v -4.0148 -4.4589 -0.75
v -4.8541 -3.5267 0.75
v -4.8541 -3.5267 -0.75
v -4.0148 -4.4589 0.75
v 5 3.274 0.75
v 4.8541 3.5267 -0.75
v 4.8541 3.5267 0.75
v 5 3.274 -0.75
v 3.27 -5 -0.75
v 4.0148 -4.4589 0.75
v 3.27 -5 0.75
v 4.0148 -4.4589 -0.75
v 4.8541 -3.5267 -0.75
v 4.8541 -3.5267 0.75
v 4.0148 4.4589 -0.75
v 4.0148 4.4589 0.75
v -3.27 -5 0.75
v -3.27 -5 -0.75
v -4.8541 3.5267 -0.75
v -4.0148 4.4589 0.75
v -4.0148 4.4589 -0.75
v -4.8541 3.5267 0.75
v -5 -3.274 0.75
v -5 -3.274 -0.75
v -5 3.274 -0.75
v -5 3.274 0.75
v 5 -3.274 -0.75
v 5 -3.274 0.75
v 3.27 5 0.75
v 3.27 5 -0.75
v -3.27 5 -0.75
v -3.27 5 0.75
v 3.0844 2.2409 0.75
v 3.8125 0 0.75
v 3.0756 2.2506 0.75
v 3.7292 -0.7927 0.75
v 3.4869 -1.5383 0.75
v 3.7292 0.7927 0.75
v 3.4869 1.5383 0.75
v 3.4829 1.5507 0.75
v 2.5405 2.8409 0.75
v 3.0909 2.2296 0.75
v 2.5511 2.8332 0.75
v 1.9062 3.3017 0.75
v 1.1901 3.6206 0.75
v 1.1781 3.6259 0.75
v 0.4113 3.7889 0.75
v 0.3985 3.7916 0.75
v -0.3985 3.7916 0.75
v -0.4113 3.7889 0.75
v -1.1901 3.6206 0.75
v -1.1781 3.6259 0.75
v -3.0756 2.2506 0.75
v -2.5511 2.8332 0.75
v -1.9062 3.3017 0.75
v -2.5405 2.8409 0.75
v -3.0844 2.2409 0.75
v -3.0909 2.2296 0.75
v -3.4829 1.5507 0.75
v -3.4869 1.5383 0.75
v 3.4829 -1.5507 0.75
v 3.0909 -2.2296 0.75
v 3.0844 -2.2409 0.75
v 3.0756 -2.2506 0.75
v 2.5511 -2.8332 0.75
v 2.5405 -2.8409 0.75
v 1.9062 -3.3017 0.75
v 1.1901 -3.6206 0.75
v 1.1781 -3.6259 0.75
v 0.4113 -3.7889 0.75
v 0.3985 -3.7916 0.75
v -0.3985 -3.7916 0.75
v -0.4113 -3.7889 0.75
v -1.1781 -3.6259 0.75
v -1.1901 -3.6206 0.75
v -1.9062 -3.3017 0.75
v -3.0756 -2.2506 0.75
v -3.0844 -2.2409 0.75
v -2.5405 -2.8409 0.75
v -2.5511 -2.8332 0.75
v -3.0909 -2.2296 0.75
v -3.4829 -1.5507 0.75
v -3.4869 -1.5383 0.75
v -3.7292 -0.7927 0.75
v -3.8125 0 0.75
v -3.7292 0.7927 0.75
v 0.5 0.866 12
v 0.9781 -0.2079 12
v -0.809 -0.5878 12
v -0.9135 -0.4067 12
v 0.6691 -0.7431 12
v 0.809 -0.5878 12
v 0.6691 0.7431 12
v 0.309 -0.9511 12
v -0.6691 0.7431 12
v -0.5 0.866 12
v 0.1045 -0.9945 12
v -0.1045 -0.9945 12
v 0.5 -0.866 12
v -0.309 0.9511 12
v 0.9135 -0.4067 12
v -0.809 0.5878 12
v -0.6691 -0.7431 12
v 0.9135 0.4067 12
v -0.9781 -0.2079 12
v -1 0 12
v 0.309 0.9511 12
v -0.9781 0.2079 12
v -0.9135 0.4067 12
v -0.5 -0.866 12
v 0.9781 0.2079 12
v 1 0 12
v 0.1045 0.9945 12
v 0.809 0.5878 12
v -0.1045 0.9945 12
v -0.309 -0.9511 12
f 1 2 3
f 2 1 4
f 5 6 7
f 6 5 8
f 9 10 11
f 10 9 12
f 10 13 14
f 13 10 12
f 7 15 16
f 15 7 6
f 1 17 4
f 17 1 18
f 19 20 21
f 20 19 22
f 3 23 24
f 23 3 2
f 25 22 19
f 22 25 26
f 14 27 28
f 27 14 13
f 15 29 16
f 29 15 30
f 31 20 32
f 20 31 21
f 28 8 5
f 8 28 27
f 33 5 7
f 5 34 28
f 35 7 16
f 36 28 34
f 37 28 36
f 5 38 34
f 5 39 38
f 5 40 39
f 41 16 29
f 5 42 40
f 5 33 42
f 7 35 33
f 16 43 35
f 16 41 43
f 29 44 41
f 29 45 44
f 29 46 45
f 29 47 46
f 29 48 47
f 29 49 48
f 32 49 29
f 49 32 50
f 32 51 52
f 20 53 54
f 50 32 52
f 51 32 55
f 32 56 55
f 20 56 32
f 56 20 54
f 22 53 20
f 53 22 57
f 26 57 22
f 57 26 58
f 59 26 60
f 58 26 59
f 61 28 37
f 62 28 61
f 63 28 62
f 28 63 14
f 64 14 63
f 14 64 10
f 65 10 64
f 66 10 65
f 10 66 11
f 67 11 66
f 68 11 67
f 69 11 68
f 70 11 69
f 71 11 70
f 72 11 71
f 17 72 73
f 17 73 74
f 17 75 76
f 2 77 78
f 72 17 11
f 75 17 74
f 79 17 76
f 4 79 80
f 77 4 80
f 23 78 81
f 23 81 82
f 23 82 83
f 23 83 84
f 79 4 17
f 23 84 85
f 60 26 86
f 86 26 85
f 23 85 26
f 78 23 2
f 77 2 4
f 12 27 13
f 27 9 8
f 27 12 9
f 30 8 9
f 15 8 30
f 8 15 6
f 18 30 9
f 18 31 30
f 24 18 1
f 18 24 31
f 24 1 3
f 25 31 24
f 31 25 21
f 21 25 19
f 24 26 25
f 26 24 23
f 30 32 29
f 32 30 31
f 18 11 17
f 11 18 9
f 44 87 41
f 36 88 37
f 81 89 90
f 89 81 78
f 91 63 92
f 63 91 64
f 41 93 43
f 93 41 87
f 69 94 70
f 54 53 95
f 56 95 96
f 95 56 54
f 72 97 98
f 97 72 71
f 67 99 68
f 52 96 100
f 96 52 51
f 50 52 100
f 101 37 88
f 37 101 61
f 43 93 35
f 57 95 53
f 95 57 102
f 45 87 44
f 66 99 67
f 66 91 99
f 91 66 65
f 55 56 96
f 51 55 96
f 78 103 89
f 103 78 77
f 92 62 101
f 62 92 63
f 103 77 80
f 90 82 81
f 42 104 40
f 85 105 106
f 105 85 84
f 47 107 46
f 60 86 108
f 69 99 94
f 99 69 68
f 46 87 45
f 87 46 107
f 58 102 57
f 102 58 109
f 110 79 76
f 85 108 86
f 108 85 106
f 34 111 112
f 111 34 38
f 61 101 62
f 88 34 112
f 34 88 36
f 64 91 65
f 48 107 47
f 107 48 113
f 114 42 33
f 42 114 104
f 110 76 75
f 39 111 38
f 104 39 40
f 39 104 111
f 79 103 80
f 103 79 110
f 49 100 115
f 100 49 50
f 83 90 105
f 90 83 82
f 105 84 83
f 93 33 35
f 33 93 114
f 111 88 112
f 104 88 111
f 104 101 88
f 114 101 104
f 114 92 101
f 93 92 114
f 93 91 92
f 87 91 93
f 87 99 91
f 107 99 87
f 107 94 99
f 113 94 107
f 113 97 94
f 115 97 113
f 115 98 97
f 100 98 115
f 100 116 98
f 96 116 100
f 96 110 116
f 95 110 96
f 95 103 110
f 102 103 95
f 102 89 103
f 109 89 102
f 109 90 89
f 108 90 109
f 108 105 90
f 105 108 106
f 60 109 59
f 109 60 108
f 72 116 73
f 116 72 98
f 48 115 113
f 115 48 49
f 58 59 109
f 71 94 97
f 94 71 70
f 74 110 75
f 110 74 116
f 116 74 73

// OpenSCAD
Base = 10;
Base_Height = 1.5;
Curve = 6;
Cone_Height = 12;
Cone_Bottom_Width = 4;
Cone_Top_Width = 1;

$fn = 30;

difference(){
	cube([Base,Base,Base_Height], center=true);
	difference(){
		cylinder(Base_Height+.1,r=Curve*2, center=true);
		cylinder(Base_Height+.1,r=Curve, center=true);
	}
}
cylinder(Cone_Height,Cone_Bottom_Width,Cone_Top_Width);
